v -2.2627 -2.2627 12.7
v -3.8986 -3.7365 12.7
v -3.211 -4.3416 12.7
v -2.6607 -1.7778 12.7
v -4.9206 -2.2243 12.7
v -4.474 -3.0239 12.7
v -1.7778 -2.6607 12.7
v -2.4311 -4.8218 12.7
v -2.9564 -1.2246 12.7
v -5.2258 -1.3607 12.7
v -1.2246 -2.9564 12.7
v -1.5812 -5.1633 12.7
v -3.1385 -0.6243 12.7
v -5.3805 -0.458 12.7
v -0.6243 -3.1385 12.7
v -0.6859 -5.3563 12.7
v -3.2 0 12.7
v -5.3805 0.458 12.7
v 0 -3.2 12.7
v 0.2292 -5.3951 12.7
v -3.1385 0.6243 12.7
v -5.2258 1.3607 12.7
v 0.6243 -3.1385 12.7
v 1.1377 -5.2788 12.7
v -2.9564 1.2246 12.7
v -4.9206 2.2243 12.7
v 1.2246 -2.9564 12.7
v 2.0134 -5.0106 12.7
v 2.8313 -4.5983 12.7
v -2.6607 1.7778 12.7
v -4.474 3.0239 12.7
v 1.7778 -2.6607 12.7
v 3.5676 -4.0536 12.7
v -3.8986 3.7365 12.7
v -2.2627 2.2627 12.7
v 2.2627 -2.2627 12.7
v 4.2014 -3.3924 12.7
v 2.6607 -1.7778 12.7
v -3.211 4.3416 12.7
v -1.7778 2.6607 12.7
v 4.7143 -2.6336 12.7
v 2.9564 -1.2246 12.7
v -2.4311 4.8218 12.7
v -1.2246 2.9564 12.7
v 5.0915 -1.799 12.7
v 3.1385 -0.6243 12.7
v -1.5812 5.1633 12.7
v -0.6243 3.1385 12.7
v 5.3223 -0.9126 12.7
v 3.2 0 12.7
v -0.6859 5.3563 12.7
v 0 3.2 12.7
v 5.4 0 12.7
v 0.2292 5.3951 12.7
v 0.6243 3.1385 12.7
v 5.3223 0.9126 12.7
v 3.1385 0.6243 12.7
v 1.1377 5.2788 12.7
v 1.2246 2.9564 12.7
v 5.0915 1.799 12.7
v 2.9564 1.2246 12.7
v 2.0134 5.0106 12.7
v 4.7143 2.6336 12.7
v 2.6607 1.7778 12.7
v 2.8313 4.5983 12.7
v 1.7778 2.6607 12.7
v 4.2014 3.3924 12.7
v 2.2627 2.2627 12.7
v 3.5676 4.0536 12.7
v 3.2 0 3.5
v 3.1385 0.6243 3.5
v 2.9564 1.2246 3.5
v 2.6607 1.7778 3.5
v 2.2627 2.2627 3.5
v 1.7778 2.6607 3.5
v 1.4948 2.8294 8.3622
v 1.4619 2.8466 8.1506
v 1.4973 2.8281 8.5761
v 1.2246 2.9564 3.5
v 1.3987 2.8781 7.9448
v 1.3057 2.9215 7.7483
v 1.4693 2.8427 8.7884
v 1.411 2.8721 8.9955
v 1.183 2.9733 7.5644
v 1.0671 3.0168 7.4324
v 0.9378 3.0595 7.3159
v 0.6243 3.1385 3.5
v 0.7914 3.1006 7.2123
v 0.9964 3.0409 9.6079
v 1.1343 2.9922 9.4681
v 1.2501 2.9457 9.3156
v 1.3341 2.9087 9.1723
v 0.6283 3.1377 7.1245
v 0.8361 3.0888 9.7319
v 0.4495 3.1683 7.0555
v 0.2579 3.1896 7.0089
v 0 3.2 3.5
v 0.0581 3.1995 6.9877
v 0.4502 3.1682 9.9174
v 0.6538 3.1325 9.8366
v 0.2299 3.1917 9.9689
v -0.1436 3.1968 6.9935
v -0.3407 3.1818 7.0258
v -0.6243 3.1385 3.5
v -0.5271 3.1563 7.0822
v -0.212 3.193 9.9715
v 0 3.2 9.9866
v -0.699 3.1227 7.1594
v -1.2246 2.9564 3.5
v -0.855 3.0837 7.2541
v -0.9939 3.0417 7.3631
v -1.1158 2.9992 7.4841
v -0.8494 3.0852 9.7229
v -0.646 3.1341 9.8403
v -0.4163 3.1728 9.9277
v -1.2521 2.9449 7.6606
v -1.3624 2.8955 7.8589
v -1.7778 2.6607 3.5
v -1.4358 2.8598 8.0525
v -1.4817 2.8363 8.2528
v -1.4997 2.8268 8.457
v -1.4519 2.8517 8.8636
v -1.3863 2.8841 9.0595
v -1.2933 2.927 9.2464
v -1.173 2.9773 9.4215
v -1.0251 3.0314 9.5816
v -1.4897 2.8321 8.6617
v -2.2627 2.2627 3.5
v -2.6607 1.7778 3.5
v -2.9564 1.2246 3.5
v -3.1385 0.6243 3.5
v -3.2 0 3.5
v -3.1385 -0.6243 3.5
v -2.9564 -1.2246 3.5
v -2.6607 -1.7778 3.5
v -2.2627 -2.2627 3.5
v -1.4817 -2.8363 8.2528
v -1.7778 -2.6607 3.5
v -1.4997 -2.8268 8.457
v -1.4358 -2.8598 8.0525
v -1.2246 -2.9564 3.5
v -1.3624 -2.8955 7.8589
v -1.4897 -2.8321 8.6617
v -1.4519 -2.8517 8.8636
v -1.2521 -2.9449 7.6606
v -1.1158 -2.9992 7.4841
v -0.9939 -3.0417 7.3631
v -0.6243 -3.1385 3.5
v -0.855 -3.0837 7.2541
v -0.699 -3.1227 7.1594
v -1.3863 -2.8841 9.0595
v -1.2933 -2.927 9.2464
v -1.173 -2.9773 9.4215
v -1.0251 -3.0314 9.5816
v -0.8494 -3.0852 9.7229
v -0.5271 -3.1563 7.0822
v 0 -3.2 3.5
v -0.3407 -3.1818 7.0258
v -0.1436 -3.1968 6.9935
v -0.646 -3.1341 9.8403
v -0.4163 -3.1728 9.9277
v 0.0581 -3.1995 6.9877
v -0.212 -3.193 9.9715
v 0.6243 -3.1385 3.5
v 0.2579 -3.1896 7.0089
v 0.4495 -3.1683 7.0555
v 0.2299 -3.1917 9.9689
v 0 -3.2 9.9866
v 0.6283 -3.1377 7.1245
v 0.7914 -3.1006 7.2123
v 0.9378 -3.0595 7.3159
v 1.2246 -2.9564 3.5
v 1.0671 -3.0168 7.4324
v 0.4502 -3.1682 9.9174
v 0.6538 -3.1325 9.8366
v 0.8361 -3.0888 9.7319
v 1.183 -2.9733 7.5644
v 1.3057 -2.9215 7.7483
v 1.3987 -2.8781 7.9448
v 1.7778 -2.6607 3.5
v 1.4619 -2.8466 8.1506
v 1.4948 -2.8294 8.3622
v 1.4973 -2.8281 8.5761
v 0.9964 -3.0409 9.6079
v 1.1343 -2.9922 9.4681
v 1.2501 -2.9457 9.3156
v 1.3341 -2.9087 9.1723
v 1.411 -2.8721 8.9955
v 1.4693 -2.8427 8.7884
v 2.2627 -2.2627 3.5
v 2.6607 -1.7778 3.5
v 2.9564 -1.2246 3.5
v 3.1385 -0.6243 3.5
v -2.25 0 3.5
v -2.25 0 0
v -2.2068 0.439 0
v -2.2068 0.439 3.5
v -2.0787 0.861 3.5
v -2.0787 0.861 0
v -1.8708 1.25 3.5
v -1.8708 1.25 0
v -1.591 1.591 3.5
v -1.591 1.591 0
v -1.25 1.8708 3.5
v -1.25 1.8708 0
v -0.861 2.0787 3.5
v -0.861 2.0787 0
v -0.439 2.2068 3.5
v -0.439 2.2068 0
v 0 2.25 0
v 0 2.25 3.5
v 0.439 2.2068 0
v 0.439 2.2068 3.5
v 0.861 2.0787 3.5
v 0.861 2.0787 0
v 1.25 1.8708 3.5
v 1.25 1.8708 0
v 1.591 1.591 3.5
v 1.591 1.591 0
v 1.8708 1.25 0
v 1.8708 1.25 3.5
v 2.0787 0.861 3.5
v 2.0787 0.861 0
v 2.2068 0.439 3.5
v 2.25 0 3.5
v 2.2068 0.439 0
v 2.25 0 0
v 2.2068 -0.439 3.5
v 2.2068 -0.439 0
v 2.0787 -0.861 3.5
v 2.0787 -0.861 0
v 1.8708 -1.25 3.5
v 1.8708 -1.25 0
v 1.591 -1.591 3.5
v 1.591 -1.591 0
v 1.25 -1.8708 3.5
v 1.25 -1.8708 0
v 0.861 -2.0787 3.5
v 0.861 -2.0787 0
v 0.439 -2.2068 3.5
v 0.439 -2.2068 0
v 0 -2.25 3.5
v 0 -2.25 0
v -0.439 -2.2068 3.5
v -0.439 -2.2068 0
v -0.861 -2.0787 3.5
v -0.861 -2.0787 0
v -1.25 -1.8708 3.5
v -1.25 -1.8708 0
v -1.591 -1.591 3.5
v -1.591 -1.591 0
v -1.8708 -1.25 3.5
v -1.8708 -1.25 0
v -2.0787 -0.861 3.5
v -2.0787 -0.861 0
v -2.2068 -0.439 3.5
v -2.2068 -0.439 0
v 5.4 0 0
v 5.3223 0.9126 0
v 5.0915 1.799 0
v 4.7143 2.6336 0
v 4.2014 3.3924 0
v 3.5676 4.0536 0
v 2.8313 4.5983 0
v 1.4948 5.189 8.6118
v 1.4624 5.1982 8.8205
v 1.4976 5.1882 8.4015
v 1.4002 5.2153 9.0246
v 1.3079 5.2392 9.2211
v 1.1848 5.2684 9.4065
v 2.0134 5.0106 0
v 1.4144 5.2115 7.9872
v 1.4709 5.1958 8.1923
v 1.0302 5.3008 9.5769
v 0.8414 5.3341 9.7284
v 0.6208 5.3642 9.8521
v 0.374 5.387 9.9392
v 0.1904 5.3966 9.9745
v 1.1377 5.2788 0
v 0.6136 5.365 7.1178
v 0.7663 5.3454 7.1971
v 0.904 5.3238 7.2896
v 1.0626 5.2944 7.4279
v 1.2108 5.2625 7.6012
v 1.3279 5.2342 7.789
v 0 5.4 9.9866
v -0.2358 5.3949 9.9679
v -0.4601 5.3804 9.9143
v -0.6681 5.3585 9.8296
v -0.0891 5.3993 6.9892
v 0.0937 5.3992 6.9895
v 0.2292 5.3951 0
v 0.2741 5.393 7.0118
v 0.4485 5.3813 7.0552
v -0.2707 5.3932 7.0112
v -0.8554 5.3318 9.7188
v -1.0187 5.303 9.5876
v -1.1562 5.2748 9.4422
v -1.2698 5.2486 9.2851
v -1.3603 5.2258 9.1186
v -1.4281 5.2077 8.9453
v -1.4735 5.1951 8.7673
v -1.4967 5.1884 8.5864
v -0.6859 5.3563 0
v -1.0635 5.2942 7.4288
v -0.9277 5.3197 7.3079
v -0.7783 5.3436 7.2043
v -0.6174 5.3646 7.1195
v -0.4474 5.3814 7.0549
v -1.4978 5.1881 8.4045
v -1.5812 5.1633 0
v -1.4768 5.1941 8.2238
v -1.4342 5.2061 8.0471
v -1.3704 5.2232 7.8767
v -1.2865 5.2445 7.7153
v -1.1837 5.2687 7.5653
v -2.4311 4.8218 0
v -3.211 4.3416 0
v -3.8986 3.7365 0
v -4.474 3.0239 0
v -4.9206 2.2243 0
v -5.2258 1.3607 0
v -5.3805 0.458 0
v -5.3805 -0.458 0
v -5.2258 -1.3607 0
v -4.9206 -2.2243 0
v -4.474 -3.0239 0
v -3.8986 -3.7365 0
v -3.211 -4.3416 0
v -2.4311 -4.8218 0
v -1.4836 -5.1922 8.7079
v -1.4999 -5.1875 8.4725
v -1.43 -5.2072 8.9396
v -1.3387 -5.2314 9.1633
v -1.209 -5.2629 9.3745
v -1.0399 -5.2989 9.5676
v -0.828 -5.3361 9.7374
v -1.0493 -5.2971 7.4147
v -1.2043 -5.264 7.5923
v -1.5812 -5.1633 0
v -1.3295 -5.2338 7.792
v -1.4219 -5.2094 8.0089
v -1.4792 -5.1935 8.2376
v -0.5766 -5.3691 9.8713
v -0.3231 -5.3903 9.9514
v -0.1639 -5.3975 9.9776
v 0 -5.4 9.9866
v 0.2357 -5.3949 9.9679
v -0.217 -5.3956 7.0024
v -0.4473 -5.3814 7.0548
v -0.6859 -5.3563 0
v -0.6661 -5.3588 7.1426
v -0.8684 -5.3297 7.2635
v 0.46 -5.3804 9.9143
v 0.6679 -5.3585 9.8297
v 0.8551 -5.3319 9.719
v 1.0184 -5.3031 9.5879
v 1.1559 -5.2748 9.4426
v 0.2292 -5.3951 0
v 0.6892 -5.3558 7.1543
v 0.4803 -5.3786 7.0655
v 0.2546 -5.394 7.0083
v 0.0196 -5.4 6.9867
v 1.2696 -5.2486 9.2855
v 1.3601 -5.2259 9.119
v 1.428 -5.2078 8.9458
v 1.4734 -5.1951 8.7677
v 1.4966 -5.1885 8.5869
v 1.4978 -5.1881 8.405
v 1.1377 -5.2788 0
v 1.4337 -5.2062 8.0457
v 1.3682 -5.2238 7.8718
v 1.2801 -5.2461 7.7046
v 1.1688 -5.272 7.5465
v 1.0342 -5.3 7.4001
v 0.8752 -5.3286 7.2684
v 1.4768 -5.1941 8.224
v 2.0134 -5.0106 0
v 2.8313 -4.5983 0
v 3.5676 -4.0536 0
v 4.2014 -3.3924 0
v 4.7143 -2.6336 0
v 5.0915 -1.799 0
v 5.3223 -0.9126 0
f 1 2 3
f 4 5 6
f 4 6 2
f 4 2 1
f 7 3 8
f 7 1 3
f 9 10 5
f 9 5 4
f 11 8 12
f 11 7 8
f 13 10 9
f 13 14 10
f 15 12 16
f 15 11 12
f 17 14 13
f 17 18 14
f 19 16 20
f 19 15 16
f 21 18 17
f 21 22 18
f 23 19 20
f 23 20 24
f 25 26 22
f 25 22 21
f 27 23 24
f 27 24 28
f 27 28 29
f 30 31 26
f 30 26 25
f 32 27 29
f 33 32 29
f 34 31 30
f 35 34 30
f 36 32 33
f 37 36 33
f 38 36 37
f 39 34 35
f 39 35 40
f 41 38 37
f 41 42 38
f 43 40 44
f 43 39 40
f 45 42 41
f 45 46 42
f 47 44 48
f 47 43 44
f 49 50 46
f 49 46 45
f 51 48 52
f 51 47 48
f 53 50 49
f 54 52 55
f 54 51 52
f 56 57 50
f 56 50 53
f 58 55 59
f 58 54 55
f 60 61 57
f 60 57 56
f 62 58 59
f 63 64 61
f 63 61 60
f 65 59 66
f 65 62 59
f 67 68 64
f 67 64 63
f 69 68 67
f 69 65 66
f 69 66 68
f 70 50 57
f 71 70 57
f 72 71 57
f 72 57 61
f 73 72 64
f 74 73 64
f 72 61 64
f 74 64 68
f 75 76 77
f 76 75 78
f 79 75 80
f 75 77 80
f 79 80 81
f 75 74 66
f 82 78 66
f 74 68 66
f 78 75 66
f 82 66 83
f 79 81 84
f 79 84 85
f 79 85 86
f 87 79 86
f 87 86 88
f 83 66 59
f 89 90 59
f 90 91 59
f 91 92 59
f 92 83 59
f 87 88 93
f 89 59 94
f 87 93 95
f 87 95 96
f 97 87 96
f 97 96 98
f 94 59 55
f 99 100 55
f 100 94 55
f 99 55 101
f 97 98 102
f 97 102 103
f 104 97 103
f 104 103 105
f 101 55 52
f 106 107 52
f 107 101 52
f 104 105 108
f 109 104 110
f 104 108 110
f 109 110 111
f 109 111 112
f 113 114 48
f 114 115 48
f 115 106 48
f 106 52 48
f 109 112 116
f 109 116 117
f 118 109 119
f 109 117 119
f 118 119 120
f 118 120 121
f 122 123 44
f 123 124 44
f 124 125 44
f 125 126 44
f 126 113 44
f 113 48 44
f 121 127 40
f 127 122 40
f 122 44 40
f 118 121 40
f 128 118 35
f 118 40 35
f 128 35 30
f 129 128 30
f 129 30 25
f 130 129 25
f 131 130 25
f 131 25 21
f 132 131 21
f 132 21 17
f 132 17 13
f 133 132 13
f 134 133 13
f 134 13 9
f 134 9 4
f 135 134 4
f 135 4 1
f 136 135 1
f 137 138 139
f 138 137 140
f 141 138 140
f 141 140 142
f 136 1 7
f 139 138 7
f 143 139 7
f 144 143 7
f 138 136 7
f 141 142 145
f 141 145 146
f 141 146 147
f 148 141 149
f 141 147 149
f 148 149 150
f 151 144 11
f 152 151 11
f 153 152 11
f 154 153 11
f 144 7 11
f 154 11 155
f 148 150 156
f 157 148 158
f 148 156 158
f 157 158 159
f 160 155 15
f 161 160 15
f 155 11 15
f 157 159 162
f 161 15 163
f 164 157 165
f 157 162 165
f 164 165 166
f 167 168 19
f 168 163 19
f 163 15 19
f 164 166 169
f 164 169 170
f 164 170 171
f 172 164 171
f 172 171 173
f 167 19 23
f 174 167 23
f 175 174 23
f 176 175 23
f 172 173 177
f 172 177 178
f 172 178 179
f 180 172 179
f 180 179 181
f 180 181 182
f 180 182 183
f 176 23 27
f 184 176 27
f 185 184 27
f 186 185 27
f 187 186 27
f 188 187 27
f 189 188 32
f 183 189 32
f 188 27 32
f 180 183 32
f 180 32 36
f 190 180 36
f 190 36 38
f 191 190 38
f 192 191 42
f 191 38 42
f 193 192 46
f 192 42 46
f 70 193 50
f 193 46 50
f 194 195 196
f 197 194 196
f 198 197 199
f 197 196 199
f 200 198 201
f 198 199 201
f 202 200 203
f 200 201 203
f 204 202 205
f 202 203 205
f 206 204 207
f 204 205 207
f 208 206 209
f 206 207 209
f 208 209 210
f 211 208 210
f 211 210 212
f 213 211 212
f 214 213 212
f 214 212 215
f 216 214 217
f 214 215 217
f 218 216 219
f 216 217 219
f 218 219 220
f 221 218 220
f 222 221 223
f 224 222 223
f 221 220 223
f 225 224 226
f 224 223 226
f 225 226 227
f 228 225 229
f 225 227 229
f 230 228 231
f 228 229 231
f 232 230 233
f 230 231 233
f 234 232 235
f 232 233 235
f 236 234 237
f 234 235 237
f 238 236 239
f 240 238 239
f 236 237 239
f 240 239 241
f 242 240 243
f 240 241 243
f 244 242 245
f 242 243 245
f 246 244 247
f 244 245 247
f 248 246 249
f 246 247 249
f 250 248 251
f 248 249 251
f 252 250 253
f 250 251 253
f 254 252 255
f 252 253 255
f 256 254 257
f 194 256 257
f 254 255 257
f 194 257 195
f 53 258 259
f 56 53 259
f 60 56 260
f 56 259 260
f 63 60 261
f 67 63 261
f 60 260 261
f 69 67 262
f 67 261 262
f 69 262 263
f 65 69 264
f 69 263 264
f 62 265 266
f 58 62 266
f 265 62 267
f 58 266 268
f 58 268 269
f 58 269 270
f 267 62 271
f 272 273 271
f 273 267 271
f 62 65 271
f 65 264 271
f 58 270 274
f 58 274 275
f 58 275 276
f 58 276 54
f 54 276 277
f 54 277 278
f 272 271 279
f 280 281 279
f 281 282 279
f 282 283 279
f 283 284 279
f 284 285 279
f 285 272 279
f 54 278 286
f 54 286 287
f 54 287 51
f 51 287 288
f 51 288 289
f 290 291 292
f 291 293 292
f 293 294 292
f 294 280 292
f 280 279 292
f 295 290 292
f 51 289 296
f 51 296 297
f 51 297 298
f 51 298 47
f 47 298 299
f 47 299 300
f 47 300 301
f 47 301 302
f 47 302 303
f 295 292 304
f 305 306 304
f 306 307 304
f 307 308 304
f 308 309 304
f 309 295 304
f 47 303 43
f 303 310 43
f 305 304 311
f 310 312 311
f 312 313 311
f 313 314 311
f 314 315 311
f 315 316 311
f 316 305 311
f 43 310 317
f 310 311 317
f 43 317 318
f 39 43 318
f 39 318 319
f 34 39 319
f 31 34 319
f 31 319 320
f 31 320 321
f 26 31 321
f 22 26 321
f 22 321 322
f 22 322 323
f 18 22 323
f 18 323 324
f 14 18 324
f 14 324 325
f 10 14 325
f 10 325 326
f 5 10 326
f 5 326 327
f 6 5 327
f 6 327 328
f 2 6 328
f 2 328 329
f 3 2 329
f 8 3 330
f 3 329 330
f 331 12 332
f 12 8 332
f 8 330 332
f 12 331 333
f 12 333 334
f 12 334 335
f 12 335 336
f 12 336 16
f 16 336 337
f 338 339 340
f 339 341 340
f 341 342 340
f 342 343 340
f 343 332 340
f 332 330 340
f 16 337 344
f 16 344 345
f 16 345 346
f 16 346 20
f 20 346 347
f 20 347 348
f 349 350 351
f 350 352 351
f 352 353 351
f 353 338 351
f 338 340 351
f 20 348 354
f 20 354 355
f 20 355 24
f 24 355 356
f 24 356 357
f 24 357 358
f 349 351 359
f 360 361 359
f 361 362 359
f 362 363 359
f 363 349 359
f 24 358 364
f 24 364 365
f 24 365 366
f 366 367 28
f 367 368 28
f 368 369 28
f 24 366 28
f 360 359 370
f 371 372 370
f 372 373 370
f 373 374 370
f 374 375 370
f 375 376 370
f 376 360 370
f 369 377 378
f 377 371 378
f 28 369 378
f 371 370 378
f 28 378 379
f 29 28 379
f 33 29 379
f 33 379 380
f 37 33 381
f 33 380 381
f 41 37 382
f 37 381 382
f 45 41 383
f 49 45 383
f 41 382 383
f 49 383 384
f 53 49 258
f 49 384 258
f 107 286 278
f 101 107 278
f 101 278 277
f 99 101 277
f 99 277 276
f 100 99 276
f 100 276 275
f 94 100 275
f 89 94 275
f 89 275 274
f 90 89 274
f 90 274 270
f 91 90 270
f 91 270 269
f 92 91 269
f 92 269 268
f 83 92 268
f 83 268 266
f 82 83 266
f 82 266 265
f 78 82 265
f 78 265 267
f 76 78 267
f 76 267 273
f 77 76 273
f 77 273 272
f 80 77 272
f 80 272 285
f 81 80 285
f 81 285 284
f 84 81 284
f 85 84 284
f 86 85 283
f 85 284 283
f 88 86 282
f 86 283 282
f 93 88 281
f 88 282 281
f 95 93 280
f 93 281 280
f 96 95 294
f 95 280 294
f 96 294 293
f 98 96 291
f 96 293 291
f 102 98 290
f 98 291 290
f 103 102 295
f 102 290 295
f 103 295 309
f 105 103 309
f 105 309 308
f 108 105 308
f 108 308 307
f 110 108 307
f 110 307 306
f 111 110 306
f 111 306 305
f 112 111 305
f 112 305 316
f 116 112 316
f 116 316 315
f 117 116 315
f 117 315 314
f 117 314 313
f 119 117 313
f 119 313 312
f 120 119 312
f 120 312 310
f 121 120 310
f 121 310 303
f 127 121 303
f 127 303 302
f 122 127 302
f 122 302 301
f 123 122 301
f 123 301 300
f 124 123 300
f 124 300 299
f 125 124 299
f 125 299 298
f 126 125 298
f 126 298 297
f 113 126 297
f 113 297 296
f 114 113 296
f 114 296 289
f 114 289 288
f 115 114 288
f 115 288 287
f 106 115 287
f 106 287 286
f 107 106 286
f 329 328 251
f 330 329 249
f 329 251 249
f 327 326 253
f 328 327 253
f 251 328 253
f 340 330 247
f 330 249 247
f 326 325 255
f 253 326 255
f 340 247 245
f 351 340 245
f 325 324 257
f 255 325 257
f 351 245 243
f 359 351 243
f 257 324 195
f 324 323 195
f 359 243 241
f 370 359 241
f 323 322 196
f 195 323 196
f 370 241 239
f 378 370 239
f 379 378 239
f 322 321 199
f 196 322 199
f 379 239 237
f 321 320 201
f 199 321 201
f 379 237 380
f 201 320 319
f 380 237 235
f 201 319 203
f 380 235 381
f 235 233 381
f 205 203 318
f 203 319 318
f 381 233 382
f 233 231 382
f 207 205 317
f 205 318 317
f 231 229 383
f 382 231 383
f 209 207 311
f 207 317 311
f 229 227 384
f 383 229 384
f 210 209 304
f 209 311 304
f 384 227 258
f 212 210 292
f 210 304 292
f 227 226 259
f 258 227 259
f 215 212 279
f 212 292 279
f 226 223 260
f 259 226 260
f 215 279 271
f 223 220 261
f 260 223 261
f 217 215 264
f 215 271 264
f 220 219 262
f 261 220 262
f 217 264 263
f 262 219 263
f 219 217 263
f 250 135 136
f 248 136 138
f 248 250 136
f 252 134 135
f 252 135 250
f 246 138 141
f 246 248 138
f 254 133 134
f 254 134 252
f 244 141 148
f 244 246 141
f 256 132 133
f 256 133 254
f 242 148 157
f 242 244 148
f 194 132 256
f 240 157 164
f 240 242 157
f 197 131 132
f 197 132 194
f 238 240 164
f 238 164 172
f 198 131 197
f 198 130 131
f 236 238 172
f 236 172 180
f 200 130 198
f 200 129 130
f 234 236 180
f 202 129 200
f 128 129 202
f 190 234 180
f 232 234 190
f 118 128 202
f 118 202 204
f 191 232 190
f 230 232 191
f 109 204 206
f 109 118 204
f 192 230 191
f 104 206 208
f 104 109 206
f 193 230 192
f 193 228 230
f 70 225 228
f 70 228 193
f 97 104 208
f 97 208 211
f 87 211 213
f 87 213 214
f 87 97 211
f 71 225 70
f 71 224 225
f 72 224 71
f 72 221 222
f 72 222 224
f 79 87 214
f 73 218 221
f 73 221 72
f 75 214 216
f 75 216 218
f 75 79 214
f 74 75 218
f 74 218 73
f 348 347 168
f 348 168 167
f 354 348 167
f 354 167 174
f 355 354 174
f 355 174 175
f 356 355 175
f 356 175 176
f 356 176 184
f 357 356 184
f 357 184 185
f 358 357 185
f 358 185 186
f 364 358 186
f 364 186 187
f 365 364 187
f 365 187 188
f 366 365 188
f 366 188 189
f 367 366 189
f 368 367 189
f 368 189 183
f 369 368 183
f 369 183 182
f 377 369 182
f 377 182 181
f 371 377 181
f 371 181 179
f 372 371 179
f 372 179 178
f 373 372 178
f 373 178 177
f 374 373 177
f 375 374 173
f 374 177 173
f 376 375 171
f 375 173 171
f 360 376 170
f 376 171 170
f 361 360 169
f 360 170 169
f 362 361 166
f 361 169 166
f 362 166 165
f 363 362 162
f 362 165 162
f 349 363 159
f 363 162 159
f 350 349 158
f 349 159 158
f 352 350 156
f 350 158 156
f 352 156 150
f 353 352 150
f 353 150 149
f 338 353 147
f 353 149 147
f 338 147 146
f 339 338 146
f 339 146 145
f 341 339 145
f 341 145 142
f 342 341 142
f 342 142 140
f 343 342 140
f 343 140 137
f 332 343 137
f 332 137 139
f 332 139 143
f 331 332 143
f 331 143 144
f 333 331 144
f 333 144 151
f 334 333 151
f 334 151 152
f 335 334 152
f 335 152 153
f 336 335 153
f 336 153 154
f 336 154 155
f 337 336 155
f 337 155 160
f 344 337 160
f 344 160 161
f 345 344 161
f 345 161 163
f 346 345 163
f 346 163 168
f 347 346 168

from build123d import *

# Parameters (mm, degrees)
SKETCH1_R           = 5.4
BOSS_EXTRUDE1_DEPTH = 12.7
SKETCH3_R           = 1.5
CUT_EXTRUDE2_DEPTH  = 12.7
SKETCH5_R           = 2.25
CUT_EXTRUDE3_DEPTH  = 3.5
SKETCH4_R           = 3.2
CUT_EXTRUDE4_DEPTH  = 9.2


with BuildPart() as part:
    # Sketch1 → Boss-Extrude1 (new body)
    with BuildSketch(Plane.XY):
        Circle(SKETCH1_R)
    extrude(amount=BOSS_EXTRUDE1_DEPTH)

    # Sketch3 → Cut-Extrude2 (cut)
    with BuildSketch(Plane(origin=(0, 5.4, 0), x_dir=(1, 0, 0), z_dir=(0, 1, 0))):
        with Locations(Location((0, -8.486582987, 0), (0, 0, 270))):
            Circle(SKETCH3_R)
    extrude(amount=-CUT_EXTRUDE2_DEPTH, mode=Mode.SUBTRACT)

    # Sketch5 → Cut-Extrude3 (cut)
    with BuildSketch(Plane(origin=(0, 0, 0), x_dir=(-1, 0, 0), z_dir=(0, 0, -1))):
        Circle(SKETCH5_R)
    extrude(amount=-CUT_EXTRUDE3_DEPTH, mode=Mode.SUBTRACT)

    # Sketch4 → Cut-Extrude4 (cut)
    with BuildSketch(Plane.XY.offset(12.7)):
        Circle(SKETCH4_R)
    extrude(amount=-CUT_EXTRUDE4_DEPTH, mode=Mode.SUBTRACT)


solid = part.part
